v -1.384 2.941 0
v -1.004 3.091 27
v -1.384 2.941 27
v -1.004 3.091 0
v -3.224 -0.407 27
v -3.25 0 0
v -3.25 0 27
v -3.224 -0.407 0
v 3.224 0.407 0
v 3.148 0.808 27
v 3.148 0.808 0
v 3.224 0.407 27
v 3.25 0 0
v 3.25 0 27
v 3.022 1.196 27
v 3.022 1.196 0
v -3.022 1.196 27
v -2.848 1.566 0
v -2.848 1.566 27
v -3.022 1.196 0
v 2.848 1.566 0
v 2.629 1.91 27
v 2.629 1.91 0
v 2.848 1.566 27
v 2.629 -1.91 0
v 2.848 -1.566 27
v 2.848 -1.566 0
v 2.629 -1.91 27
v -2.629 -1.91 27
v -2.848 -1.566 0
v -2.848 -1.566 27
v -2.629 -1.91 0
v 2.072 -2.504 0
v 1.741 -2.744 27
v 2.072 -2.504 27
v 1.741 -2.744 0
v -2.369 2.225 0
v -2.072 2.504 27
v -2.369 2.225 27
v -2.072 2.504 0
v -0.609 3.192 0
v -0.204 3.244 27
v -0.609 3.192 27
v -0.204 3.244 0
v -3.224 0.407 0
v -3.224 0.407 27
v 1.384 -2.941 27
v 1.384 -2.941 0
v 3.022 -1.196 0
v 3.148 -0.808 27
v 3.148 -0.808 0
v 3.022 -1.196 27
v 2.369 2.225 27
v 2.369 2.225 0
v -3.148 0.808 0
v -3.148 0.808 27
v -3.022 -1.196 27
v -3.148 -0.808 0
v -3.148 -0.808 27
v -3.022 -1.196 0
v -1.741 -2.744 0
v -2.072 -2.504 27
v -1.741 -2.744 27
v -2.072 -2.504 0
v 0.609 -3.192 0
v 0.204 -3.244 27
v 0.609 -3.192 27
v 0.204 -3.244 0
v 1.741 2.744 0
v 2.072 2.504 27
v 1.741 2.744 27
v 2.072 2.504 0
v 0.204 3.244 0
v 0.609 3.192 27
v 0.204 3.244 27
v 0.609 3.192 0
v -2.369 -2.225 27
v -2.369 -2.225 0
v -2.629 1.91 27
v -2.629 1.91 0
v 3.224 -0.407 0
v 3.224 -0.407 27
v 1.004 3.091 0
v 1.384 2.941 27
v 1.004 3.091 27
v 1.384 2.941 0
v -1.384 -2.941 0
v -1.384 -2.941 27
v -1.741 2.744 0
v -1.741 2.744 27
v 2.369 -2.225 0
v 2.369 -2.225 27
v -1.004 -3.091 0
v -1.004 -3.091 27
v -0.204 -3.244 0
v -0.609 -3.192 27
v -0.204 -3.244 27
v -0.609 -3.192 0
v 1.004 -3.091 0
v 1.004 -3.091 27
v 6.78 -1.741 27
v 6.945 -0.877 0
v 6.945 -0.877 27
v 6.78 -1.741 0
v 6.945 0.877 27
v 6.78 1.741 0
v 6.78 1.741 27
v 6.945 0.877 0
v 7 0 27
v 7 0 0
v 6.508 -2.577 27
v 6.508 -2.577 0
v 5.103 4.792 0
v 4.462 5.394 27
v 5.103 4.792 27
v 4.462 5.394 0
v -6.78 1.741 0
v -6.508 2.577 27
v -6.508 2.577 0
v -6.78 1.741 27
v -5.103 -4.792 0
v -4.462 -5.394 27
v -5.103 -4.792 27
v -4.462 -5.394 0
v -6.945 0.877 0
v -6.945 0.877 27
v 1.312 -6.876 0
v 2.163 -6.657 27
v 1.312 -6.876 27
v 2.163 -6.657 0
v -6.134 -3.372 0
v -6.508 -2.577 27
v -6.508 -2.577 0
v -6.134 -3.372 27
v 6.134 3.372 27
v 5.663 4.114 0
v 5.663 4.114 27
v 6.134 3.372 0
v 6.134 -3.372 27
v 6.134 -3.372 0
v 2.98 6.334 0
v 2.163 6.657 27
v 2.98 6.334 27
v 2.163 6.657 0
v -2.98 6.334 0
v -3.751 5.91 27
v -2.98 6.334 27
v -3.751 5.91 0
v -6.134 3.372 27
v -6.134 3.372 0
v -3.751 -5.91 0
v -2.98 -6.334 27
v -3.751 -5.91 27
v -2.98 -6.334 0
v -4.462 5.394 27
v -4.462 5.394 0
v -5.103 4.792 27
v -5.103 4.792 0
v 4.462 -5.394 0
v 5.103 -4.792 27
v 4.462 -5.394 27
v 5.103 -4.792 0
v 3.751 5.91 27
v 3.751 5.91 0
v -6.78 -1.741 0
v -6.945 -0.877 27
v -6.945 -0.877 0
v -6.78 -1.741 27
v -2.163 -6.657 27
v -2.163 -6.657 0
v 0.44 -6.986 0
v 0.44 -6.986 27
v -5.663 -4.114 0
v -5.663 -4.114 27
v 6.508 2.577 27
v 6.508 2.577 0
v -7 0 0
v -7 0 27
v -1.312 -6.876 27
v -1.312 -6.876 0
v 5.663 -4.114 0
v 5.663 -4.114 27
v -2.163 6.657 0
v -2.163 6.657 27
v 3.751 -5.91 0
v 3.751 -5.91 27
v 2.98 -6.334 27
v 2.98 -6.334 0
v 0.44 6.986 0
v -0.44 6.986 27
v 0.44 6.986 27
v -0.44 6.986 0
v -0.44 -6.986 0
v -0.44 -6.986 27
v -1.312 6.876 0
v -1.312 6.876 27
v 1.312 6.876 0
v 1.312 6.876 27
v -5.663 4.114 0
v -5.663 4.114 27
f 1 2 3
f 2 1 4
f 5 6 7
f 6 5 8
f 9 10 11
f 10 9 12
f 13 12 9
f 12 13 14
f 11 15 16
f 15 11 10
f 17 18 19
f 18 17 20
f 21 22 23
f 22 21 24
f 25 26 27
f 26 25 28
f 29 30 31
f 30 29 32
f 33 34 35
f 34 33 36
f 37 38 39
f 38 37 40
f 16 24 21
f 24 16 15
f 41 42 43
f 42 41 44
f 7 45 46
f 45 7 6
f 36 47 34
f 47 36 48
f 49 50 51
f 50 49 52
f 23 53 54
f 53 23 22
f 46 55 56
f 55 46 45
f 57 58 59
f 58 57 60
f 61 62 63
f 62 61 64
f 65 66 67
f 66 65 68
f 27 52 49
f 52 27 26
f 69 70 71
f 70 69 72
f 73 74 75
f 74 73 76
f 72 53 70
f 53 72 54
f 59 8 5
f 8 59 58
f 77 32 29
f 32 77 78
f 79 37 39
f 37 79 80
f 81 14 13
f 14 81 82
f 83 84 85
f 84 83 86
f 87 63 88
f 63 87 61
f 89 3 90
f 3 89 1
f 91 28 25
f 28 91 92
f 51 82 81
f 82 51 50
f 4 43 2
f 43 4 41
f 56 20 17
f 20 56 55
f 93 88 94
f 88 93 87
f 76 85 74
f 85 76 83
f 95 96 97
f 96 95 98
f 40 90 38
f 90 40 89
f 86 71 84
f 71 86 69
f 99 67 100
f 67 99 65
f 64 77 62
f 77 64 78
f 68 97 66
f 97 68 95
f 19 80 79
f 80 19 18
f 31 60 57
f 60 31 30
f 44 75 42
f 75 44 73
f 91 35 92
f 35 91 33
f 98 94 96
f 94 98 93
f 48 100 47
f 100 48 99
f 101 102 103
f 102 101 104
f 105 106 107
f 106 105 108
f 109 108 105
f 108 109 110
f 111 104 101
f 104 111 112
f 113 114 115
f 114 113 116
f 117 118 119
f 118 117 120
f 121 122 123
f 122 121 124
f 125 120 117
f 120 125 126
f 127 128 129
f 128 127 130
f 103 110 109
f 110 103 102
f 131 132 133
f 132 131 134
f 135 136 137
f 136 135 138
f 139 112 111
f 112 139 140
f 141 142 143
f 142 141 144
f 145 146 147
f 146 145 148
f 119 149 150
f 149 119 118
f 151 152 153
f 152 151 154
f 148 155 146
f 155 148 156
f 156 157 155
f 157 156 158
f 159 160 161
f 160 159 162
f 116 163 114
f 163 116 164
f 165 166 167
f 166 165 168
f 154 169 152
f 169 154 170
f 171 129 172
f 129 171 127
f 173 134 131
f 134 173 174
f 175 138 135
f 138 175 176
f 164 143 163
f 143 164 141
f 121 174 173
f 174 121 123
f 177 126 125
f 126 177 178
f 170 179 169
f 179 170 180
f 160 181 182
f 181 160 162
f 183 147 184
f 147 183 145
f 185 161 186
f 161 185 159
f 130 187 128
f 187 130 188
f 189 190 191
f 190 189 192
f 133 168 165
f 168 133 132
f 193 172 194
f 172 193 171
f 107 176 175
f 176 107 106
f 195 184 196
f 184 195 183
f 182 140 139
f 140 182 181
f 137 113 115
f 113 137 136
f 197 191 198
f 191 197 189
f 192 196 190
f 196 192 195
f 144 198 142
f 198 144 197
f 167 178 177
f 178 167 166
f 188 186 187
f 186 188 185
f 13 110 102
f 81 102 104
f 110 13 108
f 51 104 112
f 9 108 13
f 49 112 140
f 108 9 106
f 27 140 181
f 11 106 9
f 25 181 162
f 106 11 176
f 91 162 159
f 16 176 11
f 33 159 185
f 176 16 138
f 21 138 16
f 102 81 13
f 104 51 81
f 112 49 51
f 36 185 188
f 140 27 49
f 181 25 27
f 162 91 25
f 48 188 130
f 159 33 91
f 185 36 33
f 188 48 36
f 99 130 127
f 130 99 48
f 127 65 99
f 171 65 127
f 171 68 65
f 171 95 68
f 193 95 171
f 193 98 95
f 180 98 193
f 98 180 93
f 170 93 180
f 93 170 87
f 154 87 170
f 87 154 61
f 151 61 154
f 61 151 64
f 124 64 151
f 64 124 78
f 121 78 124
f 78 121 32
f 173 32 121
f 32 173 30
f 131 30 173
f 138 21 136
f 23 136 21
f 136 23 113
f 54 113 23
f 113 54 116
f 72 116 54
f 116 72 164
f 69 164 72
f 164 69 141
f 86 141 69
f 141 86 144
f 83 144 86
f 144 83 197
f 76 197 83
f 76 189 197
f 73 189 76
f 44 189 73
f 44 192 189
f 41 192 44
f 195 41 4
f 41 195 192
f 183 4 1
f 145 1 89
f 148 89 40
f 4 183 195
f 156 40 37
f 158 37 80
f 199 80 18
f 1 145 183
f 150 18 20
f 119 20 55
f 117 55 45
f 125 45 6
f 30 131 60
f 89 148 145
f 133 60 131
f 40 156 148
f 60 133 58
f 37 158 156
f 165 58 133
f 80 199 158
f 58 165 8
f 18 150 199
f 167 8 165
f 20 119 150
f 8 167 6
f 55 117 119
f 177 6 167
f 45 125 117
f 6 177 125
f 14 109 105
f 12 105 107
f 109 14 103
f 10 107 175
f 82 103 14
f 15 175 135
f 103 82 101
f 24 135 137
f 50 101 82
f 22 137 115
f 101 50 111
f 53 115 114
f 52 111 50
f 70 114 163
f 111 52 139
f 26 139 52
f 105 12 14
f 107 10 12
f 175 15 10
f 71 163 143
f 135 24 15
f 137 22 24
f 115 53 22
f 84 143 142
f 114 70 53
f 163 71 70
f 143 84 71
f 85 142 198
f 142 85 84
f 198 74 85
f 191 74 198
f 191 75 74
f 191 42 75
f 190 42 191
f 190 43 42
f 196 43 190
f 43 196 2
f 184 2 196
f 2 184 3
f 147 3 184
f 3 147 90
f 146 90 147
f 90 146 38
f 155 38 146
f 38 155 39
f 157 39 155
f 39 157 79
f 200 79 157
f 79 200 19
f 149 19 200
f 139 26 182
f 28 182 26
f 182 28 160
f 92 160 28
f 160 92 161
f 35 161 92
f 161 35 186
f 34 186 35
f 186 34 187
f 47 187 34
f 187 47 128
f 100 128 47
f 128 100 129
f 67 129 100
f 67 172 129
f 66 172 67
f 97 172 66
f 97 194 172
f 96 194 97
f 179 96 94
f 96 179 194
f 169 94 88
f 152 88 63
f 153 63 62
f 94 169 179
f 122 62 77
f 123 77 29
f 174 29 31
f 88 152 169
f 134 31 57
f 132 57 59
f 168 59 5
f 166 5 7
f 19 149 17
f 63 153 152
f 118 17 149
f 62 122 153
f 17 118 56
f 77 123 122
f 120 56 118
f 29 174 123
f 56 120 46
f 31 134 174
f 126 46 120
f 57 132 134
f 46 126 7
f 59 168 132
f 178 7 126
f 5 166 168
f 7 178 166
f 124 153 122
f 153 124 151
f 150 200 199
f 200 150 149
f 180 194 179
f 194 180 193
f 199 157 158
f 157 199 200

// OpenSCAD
$fn = 50;


difference() {
	union() {
		cylinder(h = 27, r = 7.0000000000);
	}
	union() {
		translate(v = [0, 0, -100]) {
			cylinder(h = 200, r = 3.2500000000);
		}
		translate(v = [0, 0, -100]) {
			cylinder(h = 200, r = 1.8000000000);
		}
	}
}
